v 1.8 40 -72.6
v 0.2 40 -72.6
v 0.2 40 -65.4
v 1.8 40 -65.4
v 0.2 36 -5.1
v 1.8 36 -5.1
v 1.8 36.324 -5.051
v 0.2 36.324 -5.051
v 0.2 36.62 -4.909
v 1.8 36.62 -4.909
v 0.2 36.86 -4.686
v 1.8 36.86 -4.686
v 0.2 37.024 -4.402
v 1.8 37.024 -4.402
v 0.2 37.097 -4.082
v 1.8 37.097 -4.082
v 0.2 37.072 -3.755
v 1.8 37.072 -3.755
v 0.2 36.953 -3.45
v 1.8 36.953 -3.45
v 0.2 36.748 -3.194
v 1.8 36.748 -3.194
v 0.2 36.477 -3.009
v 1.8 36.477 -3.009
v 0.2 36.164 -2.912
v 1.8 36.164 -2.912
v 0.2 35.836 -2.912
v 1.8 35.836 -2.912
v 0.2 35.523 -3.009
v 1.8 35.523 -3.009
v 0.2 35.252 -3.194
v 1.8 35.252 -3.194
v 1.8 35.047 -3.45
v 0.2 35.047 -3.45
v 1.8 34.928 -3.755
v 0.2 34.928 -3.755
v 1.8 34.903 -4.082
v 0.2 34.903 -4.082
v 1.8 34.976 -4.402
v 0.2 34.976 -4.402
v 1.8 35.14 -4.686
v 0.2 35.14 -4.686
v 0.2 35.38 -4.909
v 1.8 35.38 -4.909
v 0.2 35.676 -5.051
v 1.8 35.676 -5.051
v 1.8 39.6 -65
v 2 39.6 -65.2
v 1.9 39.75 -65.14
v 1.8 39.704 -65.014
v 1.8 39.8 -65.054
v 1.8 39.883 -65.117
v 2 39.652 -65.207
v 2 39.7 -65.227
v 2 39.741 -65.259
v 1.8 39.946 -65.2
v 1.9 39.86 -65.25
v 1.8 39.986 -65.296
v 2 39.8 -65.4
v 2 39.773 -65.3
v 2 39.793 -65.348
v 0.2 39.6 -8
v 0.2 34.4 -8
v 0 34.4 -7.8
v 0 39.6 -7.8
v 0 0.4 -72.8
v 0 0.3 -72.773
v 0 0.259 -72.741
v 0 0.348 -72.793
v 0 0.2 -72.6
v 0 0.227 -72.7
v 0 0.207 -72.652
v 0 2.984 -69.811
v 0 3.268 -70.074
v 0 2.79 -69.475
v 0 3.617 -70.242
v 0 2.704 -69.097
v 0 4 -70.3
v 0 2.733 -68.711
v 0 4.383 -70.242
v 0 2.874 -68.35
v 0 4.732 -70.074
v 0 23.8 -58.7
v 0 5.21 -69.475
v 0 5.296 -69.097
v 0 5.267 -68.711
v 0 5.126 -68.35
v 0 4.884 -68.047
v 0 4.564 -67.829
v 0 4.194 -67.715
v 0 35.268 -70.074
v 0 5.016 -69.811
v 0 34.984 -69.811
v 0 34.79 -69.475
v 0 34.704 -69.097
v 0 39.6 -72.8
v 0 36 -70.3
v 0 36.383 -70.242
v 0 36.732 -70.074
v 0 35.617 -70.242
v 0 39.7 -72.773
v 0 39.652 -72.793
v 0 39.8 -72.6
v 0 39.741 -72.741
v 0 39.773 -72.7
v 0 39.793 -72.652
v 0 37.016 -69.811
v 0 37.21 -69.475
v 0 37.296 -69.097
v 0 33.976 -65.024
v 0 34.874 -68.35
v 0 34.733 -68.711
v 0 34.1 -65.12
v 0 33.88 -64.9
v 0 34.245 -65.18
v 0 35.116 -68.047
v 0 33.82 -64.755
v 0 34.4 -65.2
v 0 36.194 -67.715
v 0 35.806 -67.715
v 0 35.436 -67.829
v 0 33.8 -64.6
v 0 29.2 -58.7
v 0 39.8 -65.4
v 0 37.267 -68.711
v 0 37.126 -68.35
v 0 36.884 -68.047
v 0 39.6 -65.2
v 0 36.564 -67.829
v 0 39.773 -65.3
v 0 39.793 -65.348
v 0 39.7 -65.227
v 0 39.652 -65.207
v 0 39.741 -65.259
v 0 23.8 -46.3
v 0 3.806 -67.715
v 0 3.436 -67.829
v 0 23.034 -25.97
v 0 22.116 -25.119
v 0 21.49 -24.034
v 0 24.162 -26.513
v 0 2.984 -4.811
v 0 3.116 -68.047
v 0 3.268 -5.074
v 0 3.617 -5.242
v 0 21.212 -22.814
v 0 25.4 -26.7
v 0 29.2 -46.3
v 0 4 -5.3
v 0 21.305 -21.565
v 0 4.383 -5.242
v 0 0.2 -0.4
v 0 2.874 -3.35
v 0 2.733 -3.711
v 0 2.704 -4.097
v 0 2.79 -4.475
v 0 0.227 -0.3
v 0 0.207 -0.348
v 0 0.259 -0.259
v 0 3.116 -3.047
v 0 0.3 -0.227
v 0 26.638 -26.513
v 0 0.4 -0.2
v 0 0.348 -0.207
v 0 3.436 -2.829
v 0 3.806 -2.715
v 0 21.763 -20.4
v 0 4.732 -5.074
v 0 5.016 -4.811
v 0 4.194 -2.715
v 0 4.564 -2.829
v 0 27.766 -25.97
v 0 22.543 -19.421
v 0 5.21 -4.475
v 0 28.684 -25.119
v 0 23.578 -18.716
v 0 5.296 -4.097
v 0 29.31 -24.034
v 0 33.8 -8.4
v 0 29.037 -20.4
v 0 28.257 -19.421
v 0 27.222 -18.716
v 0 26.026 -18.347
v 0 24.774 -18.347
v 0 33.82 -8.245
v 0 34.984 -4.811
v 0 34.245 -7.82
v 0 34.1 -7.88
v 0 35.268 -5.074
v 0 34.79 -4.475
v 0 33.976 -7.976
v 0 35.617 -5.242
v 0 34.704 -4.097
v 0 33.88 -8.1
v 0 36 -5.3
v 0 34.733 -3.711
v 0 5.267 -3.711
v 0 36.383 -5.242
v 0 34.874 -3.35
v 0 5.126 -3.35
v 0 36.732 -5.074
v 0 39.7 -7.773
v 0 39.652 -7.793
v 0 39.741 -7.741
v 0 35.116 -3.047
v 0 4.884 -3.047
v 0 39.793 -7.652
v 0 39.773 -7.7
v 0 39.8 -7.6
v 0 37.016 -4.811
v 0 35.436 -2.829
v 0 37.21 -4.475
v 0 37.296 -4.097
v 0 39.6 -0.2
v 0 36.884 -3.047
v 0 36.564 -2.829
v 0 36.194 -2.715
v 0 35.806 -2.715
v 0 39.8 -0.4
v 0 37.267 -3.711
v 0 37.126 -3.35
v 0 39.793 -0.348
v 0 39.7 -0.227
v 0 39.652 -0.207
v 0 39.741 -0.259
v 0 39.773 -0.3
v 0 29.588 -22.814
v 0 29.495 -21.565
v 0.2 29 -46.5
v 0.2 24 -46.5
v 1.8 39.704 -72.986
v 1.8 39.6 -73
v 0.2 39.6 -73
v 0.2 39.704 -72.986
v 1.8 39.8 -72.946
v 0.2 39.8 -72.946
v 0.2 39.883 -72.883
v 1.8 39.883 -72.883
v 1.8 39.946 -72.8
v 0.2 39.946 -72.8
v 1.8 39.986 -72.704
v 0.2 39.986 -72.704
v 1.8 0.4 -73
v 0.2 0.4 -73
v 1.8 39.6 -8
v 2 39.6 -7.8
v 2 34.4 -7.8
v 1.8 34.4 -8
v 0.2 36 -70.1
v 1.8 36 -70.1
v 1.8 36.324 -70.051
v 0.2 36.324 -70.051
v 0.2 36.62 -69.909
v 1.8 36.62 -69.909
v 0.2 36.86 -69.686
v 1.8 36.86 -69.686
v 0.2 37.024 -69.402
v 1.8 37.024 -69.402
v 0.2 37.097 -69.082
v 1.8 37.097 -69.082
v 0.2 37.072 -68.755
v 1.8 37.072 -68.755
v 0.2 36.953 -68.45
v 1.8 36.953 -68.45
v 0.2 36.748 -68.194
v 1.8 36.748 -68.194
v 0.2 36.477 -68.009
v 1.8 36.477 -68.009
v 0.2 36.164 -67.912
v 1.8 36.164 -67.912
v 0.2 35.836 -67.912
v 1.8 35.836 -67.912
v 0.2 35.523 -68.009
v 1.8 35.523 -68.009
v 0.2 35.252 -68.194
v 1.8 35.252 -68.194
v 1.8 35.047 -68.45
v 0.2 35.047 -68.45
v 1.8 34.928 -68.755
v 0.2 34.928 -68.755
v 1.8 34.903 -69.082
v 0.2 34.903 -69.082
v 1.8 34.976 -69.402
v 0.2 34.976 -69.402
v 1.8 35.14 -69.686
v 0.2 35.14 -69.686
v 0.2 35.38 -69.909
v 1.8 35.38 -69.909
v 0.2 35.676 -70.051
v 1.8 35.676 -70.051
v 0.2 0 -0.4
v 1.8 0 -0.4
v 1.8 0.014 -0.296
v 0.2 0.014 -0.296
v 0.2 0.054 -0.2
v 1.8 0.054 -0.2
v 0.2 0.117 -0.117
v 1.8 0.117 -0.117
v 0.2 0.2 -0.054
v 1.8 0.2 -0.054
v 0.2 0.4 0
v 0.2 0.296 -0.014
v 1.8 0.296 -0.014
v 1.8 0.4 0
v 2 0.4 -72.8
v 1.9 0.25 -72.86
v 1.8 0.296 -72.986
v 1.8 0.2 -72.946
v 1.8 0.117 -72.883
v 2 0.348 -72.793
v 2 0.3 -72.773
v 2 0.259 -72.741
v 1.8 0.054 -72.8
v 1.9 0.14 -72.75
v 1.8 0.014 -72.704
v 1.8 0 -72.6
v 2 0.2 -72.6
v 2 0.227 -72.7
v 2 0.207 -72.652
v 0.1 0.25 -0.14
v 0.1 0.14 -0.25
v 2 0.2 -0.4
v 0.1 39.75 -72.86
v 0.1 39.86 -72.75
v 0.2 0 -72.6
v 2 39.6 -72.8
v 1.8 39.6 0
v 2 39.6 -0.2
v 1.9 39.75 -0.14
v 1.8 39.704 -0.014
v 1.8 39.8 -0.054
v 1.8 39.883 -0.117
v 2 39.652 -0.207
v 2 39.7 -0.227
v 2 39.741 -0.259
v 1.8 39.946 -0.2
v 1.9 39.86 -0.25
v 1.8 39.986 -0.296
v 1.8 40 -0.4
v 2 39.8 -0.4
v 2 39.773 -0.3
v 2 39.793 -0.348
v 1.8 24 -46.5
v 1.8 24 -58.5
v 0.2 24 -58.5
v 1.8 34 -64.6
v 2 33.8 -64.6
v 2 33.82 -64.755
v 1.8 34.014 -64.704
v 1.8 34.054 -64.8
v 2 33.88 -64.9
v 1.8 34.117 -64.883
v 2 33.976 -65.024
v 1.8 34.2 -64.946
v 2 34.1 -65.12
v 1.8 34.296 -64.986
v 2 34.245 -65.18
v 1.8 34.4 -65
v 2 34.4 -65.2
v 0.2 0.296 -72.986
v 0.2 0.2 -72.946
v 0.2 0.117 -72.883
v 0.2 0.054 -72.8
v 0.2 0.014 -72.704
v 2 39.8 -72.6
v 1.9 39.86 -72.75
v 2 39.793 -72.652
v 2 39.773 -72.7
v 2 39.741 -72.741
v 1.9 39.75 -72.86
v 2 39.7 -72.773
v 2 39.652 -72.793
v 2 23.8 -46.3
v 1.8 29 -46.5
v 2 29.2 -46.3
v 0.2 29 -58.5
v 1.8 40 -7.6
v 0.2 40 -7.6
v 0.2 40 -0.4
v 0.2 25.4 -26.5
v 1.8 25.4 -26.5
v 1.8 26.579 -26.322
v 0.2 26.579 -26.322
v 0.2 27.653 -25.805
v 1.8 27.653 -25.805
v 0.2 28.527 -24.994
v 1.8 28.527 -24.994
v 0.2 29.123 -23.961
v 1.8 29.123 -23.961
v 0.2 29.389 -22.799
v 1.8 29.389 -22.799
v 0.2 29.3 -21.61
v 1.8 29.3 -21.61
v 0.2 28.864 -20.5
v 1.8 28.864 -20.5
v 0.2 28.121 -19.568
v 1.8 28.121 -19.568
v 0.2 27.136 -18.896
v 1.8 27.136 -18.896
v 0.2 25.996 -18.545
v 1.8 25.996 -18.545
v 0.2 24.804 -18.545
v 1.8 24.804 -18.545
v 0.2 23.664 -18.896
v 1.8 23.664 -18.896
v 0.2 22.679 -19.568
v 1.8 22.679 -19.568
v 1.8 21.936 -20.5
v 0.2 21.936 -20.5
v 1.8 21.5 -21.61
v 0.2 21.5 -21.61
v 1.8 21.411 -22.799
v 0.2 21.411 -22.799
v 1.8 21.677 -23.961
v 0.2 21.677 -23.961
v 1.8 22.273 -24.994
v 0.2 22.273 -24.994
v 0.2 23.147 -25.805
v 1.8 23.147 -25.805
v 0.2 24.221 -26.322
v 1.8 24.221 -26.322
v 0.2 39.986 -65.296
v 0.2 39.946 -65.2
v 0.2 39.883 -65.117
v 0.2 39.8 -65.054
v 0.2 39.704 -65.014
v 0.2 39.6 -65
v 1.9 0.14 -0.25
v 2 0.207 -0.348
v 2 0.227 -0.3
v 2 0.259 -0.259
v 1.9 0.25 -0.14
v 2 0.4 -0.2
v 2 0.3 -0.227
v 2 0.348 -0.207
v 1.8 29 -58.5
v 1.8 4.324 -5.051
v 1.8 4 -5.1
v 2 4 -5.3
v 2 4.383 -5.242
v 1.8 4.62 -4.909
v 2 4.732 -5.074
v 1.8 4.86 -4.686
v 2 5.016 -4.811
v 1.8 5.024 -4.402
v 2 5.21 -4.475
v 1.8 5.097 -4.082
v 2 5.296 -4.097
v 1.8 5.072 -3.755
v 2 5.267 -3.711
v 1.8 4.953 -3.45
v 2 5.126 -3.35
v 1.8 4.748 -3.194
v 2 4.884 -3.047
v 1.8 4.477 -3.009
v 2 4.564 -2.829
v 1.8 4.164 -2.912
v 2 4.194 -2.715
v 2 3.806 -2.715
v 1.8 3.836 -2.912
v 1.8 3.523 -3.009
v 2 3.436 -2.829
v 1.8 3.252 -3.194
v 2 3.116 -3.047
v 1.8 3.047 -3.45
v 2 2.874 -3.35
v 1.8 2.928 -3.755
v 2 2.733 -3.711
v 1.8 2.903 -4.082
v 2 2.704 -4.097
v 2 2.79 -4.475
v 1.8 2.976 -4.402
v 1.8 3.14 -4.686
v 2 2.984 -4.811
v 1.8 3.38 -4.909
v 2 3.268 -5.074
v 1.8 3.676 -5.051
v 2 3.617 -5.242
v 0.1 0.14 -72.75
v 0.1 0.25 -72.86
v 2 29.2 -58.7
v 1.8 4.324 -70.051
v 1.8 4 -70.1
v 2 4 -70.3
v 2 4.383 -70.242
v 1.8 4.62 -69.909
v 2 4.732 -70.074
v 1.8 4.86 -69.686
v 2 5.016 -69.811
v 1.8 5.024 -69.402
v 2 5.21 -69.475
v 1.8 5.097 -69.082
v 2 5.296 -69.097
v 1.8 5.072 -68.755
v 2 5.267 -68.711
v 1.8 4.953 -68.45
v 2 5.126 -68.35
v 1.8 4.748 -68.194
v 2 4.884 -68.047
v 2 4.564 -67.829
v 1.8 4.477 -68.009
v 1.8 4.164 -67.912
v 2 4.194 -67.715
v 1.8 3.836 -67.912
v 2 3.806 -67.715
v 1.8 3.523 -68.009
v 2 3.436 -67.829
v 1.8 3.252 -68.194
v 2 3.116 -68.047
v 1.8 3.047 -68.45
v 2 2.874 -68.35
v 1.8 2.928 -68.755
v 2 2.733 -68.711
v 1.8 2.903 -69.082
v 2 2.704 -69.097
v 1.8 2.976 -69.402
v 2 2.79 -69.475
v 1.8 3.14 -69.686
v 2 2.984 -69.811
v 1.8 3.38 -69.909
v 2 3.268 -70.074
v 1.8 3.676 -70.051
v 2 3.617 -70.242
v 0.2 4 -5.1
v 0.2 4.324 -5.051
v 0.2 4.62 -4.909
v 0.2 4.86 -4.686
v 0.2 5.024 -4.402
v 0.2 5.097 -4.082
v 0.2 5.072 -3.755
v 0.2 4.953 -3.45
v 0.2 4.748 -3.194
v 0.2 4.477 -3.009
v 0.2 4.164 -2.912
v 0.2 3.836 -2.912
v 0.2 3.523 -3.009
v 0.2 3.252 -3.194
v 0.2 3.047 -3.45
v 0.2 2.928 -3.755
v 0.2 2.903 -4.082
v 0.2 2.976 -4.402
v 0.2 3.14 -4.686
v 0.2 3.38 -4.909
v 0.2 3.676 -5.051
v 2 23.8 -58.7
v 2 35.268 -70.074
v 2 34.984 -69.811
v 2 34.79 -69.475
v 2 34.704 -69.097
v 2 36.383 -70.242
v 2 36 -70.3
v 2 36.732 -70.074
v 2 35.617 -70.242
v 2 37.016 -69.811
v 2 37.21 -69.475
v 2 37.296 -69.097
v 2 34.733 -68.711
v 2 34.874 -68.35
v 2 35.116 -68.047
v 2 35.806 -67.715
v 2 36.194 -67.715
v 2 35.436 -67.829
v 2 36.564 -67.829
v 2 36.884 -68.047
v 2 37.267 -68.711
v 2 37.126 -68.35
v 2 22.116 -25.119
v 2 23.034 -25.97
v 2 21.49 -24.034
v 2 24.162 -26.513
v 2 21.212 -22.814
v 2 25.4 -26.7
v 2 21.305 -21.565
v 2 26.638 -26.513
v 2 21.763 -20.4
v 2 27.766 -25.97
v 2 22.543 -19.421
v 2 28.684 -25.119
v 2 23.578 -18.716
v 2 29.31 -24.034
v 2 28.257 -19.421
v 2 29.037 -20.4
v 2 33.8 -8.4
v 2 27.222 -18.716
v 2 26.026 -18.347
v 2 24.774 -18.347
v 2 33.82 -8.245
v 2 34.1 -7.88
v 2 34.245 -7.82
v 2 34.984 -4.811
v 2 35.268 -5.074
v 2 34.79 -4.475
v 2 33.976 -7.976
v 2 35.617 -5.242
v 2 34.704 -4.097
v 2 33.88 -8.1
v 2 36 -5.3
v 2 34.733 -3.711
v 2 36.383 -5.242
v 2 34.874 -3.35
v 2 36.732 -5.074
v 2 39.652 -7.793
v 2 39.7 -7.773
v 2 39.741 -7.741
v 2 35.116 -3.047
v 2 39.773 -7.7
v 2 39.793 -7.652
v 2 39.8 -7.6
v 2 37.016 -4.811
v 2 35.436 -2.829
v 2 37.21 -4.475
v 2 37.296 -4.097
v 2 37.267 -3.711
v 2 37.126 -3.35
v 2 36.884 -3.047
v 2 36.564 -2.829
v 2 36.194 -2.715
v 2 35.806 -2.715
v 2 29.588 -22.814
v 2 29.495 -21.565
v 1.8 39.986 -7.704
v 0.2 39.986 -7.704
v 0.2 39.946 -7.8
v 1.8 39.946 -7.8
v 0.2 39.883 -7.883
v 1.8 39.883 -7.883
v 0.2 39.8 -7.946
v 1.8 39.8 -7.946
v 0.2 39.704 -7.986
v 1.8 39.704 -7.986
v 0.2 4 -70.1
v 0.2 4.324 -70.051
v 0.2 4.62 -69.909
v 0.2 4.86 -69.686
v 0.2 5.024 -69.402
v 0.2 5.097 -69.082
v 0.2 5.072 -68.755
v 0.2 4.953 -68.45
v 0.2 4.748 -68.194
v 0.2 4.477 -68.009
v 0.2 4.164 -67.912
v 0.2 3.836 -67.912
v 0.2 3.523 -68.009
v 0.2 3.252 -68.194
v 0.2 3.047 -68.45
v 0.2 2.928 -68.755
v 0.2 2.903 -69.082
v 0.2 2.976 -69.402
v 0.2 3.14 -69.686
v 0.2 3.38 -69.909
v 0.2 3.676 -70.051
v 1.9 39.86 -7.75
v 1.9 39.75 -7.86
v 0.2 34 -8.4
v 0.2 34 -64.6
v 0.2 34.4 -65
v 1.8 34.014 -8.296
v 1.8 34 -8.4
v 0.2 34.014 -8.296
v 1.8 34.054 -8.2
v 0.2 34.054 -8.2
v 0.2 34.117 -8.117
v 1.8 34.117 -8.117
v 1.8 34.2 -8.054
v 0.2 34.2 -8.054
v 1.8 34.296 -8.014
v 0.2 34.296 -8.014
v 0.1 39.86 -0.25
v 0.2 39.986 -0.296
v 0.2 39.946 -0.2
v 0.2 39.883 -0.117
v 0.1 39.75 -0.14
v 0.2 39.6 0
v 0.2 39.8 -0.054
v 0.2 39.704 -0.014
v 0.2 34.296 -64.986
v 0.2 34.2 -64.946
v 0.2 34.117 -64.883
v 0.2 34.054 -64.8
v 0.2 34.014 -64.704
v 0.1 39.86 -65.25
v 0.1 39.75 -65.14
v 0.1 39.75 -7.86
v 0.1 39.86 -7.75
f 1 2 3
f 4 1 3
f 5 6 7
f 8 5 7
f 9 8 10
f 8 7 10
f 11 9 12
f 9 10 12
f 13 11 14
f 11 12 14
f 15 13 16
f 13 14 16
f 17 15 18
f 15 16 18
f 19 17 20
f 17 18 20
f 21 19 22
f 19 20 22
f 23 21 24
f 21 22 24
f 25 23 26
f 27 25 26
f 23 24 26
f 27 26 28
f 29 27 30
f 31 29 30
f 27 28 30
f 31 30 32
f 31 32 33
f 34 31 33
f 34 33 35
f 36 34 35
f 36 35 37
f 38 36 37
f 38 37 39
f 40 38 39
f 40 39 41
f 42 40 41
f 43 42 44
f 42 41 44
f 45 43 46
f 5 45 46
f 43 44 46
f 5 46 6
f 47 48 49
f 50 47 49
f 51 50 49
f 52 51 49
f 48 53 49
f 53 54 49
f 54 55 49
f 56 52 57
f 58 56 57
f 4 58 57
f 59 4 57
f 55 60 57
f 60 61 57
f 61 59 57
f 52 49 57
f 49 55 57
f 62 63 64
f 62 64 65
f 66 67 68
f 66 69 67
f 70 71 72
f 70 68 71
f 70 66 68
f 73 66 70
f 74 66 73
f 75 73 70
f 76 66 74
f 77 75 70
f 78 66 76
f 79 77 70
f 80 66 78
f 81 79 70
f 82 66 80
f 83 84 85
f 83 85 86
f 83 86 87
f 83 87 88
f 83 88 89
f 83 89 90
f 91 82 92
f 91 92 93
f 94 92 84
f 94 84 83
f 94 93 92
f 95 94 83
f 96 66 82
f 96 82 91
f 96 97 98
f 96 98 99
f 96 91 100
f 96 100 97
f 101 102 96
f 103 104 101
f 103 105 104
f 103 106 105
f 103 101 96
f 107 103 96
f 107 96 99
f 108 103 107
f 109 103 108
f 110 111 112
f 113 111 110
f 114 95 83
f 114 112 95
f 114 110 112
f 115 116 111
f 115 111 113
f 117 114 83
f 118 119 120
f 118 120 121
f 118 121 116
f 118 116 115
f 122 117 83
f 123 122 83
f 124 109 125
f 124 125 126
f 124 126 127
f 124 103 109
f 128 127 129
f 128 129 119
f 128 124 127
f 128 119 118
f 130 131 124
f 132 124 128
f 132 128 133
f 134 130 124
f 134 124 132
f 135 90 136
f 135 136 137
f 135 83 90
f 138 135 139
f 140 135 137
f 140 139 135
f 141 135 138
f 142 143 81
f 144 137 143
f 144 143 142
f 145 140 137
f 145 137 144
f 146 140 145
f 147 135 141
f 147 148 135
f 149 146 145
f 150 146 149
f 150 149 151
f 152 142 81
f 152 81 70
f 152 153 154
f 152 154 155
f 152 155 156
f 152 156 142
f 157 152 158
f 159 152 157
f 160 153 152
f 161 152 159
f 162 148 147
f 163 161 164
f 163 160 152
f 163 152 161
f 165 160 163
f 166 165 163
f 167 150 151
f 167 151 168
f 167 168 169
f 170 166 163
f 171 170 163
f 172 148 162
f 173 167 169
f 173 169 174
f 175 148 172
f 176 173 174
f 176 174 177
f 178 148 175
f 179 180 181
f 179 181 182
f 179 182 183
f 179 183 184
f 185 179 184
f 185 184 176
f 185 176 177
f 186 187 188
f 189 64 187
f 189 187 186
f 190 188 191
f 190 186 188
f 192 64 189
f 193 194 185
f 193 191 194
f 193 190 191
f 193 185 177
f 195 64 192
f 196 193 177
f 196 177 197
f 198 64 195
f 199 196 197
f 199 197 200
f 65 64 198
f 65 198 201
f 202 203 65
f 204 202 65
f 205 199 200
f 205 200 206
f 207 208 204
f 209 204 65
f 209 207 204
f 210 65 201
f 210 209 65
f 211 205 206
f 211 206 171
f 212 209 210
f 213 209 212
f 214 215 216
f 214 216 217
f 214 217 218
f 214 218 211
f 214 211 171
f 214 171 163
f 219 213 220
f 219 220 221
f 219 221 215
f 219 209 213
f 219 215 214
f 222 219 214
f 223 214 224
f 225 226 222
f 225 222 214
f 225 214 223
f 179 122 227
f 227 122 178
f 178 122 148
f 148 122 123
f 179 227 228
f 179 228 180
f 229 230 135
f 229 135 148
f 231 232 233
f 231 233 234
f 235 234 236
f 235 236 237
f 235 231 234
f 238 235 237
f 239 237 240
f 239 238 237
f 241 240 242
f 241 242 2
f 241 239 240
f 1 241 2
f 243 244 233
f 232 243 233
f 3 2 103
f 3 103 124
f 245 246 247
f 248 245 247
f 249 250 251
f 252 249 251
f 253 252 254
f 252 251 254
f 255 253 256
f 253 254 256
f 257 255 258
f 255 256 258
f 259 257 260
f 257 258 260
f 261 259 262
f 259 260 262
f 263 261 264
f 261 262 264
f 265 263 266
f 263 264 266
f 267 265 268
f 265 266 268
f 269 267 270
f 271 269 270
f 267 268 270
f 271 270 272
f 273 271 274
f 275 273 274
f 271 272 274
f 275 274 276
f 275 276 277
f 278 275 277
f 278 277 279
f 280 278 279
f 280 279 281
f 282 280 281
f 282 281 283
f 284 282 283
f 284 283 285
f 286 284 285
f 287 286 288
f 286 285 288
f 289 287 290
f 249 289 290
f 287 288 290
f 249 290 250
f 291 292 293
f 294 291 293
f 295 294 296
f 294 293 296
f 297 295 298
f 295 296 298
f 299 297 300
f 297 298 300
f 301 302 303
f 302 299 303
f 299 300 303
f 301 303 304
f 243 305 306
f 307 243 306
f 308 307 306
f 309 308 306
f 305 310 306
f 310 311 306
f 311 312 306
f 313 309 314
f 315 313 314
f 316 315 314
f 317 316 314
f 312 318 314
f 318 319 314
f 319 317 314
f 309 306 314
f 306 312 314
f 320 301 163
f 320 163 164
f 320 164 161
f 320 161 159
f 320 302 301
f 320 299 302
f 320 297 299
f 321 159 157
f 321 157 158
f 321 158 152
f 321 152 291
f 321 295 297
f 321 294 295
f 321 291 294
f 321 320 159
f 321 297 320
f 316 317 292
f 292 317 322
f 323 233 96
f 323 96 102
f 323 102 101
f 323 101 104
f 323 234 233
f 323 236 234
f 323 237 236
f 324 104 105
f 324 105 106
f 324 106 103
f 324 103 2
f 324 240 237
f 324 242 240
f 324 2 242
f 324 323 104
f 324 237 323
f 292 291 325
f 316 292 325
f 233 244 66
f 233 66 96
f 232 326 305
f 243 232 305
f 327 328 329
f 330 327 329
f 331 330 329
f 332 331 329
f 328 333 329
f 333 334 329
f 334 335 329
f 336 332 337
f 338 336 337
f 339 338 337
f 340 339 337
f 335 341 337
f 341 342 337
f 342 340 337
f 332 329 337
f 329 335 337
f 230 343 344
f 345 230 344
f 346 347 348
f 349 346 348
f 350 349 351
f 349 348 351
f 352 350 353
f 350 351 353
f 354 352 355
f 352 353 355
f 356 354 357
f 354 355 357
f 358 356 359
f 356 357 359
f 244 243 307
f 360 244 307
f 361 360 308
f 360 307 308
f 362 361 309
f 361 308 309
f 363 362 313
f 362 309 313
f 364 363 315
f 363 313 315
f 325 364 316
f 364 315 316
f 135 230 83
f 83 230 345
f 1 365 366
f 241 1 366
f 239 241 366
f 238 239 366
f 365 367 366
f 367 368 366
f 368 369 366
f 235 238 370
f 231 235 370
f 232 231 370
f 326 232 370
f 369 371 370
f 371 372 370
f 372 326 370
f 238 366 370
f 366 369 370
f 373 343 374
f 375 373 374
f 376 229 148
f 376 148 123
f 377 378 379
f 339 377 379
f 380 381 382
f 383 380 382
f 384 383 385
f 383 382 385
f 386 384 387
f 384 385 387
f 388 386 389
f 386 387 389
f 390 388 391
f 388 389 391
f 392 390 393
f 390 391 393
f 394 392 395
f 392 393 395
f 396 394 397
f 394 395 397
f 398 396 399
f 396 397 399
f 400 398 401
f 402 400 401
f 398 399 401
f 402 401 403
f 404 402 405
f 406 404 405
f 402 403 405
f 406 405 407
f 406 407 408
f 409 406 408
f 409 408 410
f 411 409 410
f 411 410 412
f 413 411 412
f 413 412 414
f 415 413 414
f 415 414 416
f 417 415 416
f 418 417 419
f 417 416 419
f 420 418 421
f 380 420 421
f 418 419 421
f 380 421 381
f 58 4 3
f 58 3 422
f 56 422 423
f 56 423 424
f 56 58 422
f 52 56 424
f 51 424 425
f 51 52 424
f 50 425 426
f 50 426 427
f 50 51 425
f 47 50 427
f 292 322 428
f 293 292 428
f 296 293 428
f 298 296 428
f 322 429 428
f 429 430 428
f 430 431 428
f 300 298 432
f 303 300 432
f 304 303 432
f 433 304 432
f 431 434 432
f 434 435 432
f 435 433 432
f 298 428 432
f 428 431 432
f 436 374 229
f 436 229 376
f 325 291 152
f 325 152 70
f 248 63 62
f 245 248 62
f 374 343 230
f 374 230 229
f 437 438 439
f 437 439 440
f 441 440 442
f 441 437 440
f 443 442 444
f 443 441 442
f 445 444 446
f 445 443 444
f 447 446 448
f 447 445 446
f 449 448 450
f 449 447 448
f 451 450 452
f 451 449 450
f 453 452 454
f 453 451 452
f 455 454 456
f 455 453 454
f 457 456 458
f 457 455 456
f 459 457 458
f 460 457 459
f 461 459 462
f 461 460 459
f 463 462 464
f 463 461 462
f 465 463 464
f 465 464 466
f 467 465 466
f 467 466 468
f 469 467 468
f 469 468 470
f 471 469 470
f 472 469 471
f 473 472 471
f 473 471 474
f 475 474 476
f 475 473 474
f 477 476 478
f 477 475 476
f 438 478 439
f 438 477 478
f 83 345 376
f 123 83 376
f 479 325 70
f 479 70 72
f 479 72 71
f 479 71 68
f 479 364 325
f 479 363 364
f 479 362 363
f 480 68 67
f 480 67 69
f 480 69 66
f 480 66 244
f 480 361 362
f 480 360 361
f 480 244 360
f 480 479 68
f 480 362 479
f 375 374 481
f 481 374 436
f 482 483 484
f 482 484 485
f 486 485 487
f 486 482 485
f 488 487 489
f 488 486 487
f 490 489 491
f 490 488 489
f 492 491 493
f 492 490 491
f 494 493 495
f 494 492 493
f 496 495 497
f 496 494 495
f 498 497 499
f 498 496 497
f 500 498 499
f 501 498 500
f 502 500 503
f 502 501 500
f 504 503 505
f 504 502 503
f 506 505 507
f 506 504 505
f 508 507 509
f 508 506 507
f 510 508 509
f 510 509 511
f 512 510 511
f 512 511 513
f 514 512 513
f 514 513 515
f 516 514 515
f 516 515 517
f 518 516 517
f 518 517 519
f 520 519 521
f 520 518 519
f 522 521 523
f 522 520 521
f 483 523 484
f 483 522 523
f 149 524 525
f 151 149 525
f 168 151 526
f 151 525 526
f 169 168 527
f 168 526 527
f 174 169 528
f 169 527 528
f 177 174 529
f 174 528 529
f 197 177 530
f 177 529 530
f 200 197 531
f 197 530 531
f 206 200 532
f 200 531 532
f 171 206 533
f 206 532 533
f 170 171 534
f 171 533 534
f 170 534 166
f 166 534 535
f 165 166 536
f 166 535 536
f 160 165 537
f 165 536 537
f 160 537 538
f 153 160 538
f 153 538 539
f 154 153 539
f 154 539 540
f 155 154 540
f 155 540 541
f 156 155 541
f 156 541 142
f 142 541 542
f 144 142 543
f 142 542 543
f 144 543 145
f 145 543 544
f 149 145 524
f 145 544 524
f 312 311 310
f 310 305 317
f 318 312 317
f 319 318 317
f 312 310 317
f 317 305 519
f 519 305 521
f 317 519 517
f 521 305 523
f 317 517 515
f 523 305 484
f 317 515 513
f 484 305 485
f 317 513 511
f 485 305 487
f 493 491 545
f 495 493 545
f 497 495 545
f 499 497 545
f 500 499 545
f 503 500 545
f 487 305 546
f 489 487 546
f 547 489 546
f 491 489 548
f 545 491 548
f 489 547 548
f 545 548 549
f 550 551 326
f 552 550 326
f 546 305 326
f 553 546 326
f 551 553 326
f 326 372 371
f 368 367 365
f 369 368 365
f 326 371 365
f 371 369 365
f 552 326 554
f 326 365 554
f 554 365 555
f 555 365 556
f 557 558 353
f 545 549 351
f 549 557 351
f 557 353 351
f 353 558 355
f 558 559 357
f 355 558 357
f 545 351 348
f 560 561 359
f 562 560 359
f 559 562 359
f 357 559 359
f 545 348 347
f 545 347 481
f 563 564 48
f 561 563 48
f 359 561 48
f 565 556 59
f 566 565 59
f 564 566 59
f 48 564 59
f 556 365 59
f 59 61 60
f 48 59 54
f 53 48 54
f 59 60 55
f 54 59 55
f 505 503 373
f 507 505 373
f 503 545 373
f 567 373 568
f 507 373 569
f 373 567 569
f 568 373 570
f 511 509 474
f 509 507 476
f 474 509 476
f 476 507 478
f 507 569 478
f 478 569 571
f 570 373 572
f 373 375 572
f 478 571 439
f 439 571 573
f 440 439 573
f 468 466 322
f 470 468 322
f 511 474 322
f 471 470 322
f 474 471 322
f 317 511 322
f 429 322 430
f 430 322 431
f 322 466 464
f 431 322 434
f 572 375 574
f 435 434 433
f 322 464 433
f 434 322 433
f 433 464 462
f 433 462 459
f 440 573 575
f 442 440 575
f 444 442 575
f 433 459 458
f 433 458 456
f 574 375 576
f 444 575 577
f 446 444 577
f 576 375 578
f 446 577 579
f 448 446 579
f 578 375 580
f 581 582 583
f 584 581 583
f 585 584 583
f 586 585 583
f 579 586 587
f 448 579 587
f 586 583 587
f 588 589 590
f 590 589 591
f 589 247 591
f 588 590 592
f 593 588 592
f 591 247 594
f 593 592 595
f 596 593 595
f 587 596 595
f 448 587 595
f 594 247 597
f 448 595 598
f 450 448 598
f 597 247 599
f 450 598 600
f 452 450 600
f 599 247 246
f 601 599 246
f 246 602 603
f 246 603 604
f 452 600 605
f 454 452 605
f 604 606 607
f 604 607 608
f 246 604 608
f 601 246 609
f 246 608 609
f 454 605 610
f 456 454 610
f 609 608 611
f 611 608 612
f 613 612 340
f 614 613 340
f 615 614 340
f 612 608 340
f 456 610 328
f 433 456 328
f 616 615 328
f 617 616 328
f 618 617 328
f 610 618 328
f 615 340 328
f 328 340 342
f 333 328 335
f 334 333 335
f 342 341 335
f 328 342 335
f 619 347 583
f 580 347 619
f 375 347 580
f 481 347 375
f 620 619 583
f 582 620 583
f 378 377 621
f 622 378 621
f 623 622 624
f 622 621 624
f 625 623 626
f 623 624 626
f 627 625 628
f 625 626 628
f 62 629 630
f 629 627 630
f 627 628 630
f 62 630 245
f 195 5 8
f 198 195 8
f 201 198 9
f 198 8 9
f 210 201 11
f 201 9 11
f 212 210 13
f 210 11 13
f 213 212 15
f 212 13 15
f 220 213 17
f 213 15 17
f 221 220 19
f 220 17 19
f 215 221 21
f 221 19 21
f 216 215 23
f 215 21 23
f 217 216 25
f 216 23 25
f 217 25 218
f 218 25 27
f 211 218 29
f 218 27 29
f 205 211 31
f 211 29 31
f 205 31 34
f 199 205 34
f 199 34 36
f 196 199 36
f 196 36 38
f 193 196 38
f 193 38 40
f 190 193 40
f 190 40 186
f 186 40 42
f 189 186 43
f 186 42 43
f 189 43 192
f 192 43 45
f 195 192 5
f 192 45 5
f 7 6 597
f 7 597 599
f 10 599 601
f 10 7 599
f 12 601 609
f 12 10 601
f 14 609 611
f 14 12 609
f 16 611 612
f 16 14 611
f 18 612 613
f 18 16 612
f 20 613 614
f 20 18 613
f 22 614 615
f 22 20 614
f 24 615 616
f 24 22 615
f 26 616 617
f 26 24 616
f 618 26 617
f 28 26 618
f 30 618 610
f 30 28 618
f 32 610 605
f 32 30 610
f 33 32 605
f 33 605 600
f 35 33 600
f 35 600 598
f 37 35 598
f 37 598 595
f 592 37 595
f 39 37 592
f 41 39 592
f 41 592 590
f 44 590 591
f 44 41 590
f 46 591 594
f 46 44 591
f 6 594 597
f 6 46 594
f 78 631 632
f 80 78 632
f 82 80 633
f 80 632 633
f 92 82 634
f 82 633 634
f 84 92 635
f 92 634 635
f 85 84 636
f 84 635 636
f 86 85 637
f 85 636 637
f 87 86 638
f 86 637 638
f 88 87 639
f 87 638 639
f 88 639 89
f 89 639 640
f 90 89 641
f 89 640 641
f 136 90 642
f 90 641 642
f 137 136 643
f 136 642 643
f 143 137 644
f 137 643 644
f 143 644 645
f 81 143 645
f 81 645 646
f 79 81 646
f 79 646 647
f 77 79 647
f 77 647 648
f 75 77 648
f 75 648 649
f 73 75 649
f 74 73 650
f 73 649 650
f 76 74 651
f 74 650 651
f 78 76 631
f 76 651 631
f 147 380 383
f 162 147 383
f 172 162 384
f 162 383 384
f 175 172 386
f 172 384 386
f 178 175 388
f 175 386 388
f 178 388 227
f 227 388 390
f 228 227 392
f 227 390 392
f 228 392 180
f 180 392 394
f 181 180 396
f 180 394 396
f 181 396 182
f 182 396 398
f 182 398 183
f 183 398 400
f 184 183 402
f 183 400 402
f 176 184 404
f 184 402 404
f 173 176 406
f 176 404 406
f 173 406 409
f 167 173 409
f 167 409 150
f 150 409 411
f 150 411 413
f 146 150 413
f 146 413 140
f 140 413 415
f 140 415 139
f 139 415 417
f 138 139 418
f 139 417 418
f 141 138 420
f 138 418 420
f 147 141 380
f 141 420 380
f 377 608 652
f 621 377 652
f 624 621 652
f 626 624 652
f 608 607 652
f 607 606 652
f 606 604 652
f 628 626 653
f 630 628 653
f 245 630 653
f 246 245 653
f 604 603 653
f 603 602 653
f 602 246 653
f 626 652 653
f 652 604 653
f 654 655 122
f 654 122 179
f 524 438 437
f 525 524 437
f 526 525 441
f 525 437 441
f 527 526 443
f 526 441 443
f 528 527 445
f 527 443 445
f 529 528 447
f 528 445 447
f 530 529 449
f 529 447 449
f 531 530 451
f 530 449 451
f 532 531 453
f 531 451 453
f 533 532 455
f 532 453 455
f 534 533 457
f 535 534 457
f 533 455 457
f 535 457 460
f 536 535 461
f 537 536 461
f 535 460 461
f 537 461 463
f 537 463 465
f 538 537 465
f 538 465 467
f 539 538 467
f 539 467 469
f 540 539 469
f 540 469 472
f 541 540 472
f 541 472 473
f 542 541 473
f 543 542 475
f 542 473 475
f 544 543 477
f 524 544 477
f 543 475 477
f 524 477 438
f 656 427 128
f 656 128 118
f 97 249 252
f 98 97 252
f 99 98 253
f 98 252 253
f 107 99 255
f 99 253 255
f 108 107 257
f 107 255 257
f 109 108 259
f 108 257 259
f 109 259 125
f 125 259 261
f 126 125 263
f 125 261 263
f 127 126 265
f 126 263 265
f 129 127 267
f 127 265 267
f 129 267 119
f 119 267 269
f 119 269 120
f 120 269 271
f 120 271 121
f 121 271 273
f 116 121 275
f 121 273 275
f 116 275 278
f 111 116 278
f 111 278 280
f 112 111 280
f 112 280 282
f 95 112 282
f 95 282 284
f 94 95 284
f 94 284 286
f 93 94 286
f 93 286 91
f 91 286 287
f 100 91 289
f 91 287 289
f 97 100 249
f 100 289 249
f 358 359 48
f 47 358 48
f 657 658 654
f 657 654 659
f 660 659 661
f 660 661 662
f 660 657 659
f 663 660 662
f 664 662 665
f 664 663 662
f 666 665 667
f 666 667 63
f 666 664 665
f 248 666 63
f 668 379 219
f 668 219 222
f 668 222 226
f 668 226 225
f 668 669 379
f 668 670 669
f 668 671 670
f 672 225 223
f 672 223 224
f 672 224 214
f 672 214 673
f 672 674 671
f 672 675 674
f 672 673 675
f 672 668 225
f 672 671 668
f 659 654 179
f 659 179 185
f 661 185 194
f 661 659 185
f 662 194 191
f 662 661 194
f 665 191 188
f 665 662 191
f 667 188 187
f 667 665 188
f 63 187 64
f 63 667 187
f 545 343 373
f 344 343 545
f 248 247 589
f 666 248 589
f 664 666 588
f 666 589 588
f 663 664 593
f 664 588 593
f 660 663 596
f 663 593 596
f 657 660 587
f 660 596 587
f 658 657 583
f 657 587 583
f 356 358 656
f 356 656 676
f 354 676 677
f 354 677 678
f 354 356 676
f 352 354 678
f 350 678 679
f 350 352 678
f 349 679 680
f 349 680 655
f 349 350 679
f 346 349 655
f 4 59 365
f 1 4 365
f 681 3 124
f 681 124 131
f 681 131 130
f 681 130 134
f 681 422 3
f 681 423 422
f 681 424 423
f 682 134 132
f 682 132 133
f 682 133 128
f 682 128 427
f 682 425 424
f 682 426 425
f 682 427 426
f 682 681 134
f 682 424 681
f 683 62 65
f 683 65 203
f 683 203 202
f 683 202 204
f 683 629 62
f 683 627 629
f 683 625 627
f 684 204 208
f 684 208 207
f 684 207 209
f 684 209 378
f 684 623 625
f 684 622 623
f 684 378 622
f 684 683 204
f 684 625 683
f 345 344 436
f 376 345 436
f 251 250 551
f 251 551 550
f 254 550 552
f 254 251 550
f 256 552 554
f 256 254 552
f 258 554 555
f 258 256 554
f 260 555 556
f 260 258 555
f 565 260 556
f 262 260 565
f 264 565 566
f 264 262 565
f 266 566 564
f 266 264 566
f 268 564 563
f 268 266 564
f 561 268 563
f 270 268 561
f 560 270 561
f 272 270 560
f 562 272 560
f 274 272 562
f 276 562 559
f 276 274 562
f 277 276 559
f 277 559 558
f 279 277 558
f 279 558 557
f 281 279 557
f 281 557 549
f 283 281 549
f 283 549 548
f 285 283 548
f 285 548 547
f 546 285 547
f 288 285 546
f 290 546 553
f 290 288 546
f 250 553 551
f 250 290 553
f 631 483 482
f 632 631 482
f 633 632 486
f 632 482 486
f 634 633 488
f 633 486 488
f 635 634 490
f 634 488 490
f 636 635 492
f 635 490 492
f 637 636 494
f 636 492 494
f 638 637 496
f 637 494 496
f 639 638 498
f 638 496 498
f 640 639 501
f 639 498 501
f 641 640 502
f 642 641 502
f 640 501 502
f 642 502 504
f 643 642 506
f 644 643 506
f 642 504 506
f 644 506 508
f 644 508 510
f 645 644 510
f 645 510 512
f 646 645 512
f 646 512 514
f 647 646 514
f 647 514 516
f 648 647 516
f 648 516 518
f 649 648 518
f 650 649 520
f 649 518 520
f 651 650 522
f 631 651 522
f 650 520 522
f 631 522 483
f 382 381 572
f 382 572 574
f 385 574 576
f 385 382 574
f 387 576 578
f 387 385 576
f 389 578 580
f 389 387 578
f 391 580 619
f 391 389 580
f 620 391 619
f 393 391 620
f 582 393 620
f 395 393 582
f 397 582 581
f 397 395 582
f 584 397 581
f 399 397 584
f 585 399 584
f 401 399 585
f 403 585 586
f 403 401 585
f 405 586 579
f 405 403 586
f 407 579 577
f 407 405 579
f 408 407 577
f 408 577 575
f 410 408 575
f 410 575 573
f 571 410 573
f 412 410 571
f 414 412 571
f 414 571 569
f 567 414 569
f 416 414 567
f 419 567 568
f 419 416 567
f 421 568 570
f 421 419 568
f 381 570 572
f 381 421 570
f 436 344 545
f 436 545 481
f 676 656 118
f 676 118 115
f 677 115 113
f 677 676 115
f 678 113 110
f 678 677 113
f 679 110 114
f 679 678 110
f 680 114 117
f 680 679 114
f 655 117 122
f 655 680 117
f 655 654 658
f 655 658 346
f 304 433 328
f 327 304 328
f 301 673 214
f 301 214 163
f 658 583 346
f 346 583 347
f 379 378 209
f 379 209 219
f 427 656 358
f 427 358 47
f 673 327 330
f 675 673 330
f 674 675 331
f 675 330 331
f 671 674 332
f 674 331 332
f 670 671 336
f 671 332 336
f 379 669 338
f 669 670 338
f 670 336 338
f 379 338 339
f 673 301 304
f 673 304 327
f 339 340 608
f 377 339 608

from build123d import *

# Parameters (mm, degrees)
SKETCH_1_W          = 73
SKETCH_1_H          = 34
EXTRUDE_1_DEPTH     = 2
SKETCH_2_R          = 4
SKETCH_2_W          = 12
SKETCH_2_H          = 5
CUT_EXTRUDE_1_DEPTH = 2
SKETCH_3_W          = 8
SKETCH_3_H          = 6
EXTRUDE_2_DEPTH     = 2
SKETCH_4_R          = 1.1
CUT_EXTRUDE_2_DEPTH = 2
FILLET_1_R          = 0.4
CHAMFER_1_SIZE      = 0.2


with BuildPart() as part:
    # 草图1 → 凸台-拉伸1 (new body)
    with BuildSketch(Plane(origin=(0, 0, 0), x_dir=(0, 0, -1), z_dir=(1, 0, 0))):
        with Locations((36.5, 17)):
            Rectangle(SKETCH_1_W, SKETCH_1_H)
    extrude(amount=EXTRUDE_1_DEPTH)

    # 草图2 → 切除-拉伸1 (cut)
    with BuildSketch(Plane(origin=(2, 0, 0), x_dir=(0, 0, -1), z_dir=(1, 0, 0))):
        with Locations((22.5, 25.4)):
            Circle(SKETCH_2_R)
        with Locations((52.5, 26.5)):
            Rectangle(SKETCH_2_W, SKETCH_2_H)
    extrude(amount=-CUT_EXTRUDE_1_DEPTH, mode=Mode.SUBTRACT)

    # 草图3 → 凸台-拉伸2 (add)
    with BuildSketch(Plane.ZY):
        with Locations((-69, 37)):
            Rectangle(SKETCH_3_W, SKETCH_3_H)
        with Locations((-4, 37)):
            Rectangle(SKETCH_3_W, SKETCH_3_H)
    extrude(amount=-EXTRUDE_2_DEPTH)

    # 草图4 → 切除-拉伸2 (cut)
    with BuildSketch(Plane(origin=(2, 0, 0), x_dir=(0, 0, -1), z_dir=(1, 0, 0))):
        with Locations((4, 36)):
            Circle(SKETCH_4_R)
        with Locations((69, 36)):
            Circle(SKETCH_4_R)
        with Locations((69, 4)):
            Circle(SKETCH_4_R)
        with Locations((4, 4)):
            Circle(SKETCH_4_R)
    extrude(amount=-CUT_EXTRUDE_2_DEPTH, mode=Mode.SUBTRACT)

    # 圆角1
    fillet_1_edges = [part.edges().sort_by_distance(p)[0] for p in [
        (1, 40, -73),
        (1, 40, -65),
        (1, 34, -65),
        (1, 40, 0),
        (1, 34, -8),
        (1, 40, -8),
        (1, 0, -73),
        (1, 0, 0),
    ]]
    fillet(fillet_1_edges, radius=FILLET_1_R)

    # 倒角1
    chamfer_1_edges = [part.edges().sort_by_distance(p)[0] for p in [
        (2, 0.117157288, -72.882842712),
        (2, 39.882842712, -72.882842712),
        (2, 39.882842712, -65.117157288),
        (2, 39.882842712, -7.882842712),
        (2, 39.882842712, -0.117157288),
        (0, 34.117157288, -8.117157288),
        (2, 34.117157288, -8.117157288),
        (0, 34.117157288, -64.882842712),
        (2, 34.117157288, -64.882842712),
        (0, 26.5, -46.5),
        (0, 29, -52.5),
        (0, 26.5, -58.5),
        (0, 24, -52.5),
        (2, 26.5, -46.5),
        (2, 24, -52.5),
        (2, 26.5, -58.5),
        (2, 29, -52.5),
        (0, 25.4, -18.5),
        (2, 25.4, -18.5),
        (0, 4, -2.9),
        (2, 4, -2.9),
        (0, 4, -67.9),
        (2, 4, -67.9),
        (0, 36, -67.9),
        (2, 36, -67.9),
        (0, 36, -2.9),
        (2, 36, -2.9),
        (0, 20, 0),
        (2, 20, 0),
        (0, 40, -4),
        (0, 37, -8),
        (0, 34, -36.5),
        (0, 37, -65),
        (0, 40, -69),
        (0, 20, -73),
        (0, 0, -36.5),
        (0, 0.117157288, -0.117157288),
        (0, 0.117157288, -72.882842712),
        (0, 39.882842712, -72.882842712),
        (0, 39.882842712, -65.117157288),
        (0, 39.882842712, -7.882842712),
        (0, 39.882842712, -0.117157288),
        (2, 40, -4),
        (2, 0, -36.5),
        (2, 20, -73),
        (2, 40, -69),
        (2, 37, -65),
        (2, 34, -36.5),
        (2, 37, -8),
        (2, 0.117157288, -0.117157288),
    ]]
    chamfer(chamfer_1_edges, length=CHAMFER_1_SIZE)


solid = part.part
